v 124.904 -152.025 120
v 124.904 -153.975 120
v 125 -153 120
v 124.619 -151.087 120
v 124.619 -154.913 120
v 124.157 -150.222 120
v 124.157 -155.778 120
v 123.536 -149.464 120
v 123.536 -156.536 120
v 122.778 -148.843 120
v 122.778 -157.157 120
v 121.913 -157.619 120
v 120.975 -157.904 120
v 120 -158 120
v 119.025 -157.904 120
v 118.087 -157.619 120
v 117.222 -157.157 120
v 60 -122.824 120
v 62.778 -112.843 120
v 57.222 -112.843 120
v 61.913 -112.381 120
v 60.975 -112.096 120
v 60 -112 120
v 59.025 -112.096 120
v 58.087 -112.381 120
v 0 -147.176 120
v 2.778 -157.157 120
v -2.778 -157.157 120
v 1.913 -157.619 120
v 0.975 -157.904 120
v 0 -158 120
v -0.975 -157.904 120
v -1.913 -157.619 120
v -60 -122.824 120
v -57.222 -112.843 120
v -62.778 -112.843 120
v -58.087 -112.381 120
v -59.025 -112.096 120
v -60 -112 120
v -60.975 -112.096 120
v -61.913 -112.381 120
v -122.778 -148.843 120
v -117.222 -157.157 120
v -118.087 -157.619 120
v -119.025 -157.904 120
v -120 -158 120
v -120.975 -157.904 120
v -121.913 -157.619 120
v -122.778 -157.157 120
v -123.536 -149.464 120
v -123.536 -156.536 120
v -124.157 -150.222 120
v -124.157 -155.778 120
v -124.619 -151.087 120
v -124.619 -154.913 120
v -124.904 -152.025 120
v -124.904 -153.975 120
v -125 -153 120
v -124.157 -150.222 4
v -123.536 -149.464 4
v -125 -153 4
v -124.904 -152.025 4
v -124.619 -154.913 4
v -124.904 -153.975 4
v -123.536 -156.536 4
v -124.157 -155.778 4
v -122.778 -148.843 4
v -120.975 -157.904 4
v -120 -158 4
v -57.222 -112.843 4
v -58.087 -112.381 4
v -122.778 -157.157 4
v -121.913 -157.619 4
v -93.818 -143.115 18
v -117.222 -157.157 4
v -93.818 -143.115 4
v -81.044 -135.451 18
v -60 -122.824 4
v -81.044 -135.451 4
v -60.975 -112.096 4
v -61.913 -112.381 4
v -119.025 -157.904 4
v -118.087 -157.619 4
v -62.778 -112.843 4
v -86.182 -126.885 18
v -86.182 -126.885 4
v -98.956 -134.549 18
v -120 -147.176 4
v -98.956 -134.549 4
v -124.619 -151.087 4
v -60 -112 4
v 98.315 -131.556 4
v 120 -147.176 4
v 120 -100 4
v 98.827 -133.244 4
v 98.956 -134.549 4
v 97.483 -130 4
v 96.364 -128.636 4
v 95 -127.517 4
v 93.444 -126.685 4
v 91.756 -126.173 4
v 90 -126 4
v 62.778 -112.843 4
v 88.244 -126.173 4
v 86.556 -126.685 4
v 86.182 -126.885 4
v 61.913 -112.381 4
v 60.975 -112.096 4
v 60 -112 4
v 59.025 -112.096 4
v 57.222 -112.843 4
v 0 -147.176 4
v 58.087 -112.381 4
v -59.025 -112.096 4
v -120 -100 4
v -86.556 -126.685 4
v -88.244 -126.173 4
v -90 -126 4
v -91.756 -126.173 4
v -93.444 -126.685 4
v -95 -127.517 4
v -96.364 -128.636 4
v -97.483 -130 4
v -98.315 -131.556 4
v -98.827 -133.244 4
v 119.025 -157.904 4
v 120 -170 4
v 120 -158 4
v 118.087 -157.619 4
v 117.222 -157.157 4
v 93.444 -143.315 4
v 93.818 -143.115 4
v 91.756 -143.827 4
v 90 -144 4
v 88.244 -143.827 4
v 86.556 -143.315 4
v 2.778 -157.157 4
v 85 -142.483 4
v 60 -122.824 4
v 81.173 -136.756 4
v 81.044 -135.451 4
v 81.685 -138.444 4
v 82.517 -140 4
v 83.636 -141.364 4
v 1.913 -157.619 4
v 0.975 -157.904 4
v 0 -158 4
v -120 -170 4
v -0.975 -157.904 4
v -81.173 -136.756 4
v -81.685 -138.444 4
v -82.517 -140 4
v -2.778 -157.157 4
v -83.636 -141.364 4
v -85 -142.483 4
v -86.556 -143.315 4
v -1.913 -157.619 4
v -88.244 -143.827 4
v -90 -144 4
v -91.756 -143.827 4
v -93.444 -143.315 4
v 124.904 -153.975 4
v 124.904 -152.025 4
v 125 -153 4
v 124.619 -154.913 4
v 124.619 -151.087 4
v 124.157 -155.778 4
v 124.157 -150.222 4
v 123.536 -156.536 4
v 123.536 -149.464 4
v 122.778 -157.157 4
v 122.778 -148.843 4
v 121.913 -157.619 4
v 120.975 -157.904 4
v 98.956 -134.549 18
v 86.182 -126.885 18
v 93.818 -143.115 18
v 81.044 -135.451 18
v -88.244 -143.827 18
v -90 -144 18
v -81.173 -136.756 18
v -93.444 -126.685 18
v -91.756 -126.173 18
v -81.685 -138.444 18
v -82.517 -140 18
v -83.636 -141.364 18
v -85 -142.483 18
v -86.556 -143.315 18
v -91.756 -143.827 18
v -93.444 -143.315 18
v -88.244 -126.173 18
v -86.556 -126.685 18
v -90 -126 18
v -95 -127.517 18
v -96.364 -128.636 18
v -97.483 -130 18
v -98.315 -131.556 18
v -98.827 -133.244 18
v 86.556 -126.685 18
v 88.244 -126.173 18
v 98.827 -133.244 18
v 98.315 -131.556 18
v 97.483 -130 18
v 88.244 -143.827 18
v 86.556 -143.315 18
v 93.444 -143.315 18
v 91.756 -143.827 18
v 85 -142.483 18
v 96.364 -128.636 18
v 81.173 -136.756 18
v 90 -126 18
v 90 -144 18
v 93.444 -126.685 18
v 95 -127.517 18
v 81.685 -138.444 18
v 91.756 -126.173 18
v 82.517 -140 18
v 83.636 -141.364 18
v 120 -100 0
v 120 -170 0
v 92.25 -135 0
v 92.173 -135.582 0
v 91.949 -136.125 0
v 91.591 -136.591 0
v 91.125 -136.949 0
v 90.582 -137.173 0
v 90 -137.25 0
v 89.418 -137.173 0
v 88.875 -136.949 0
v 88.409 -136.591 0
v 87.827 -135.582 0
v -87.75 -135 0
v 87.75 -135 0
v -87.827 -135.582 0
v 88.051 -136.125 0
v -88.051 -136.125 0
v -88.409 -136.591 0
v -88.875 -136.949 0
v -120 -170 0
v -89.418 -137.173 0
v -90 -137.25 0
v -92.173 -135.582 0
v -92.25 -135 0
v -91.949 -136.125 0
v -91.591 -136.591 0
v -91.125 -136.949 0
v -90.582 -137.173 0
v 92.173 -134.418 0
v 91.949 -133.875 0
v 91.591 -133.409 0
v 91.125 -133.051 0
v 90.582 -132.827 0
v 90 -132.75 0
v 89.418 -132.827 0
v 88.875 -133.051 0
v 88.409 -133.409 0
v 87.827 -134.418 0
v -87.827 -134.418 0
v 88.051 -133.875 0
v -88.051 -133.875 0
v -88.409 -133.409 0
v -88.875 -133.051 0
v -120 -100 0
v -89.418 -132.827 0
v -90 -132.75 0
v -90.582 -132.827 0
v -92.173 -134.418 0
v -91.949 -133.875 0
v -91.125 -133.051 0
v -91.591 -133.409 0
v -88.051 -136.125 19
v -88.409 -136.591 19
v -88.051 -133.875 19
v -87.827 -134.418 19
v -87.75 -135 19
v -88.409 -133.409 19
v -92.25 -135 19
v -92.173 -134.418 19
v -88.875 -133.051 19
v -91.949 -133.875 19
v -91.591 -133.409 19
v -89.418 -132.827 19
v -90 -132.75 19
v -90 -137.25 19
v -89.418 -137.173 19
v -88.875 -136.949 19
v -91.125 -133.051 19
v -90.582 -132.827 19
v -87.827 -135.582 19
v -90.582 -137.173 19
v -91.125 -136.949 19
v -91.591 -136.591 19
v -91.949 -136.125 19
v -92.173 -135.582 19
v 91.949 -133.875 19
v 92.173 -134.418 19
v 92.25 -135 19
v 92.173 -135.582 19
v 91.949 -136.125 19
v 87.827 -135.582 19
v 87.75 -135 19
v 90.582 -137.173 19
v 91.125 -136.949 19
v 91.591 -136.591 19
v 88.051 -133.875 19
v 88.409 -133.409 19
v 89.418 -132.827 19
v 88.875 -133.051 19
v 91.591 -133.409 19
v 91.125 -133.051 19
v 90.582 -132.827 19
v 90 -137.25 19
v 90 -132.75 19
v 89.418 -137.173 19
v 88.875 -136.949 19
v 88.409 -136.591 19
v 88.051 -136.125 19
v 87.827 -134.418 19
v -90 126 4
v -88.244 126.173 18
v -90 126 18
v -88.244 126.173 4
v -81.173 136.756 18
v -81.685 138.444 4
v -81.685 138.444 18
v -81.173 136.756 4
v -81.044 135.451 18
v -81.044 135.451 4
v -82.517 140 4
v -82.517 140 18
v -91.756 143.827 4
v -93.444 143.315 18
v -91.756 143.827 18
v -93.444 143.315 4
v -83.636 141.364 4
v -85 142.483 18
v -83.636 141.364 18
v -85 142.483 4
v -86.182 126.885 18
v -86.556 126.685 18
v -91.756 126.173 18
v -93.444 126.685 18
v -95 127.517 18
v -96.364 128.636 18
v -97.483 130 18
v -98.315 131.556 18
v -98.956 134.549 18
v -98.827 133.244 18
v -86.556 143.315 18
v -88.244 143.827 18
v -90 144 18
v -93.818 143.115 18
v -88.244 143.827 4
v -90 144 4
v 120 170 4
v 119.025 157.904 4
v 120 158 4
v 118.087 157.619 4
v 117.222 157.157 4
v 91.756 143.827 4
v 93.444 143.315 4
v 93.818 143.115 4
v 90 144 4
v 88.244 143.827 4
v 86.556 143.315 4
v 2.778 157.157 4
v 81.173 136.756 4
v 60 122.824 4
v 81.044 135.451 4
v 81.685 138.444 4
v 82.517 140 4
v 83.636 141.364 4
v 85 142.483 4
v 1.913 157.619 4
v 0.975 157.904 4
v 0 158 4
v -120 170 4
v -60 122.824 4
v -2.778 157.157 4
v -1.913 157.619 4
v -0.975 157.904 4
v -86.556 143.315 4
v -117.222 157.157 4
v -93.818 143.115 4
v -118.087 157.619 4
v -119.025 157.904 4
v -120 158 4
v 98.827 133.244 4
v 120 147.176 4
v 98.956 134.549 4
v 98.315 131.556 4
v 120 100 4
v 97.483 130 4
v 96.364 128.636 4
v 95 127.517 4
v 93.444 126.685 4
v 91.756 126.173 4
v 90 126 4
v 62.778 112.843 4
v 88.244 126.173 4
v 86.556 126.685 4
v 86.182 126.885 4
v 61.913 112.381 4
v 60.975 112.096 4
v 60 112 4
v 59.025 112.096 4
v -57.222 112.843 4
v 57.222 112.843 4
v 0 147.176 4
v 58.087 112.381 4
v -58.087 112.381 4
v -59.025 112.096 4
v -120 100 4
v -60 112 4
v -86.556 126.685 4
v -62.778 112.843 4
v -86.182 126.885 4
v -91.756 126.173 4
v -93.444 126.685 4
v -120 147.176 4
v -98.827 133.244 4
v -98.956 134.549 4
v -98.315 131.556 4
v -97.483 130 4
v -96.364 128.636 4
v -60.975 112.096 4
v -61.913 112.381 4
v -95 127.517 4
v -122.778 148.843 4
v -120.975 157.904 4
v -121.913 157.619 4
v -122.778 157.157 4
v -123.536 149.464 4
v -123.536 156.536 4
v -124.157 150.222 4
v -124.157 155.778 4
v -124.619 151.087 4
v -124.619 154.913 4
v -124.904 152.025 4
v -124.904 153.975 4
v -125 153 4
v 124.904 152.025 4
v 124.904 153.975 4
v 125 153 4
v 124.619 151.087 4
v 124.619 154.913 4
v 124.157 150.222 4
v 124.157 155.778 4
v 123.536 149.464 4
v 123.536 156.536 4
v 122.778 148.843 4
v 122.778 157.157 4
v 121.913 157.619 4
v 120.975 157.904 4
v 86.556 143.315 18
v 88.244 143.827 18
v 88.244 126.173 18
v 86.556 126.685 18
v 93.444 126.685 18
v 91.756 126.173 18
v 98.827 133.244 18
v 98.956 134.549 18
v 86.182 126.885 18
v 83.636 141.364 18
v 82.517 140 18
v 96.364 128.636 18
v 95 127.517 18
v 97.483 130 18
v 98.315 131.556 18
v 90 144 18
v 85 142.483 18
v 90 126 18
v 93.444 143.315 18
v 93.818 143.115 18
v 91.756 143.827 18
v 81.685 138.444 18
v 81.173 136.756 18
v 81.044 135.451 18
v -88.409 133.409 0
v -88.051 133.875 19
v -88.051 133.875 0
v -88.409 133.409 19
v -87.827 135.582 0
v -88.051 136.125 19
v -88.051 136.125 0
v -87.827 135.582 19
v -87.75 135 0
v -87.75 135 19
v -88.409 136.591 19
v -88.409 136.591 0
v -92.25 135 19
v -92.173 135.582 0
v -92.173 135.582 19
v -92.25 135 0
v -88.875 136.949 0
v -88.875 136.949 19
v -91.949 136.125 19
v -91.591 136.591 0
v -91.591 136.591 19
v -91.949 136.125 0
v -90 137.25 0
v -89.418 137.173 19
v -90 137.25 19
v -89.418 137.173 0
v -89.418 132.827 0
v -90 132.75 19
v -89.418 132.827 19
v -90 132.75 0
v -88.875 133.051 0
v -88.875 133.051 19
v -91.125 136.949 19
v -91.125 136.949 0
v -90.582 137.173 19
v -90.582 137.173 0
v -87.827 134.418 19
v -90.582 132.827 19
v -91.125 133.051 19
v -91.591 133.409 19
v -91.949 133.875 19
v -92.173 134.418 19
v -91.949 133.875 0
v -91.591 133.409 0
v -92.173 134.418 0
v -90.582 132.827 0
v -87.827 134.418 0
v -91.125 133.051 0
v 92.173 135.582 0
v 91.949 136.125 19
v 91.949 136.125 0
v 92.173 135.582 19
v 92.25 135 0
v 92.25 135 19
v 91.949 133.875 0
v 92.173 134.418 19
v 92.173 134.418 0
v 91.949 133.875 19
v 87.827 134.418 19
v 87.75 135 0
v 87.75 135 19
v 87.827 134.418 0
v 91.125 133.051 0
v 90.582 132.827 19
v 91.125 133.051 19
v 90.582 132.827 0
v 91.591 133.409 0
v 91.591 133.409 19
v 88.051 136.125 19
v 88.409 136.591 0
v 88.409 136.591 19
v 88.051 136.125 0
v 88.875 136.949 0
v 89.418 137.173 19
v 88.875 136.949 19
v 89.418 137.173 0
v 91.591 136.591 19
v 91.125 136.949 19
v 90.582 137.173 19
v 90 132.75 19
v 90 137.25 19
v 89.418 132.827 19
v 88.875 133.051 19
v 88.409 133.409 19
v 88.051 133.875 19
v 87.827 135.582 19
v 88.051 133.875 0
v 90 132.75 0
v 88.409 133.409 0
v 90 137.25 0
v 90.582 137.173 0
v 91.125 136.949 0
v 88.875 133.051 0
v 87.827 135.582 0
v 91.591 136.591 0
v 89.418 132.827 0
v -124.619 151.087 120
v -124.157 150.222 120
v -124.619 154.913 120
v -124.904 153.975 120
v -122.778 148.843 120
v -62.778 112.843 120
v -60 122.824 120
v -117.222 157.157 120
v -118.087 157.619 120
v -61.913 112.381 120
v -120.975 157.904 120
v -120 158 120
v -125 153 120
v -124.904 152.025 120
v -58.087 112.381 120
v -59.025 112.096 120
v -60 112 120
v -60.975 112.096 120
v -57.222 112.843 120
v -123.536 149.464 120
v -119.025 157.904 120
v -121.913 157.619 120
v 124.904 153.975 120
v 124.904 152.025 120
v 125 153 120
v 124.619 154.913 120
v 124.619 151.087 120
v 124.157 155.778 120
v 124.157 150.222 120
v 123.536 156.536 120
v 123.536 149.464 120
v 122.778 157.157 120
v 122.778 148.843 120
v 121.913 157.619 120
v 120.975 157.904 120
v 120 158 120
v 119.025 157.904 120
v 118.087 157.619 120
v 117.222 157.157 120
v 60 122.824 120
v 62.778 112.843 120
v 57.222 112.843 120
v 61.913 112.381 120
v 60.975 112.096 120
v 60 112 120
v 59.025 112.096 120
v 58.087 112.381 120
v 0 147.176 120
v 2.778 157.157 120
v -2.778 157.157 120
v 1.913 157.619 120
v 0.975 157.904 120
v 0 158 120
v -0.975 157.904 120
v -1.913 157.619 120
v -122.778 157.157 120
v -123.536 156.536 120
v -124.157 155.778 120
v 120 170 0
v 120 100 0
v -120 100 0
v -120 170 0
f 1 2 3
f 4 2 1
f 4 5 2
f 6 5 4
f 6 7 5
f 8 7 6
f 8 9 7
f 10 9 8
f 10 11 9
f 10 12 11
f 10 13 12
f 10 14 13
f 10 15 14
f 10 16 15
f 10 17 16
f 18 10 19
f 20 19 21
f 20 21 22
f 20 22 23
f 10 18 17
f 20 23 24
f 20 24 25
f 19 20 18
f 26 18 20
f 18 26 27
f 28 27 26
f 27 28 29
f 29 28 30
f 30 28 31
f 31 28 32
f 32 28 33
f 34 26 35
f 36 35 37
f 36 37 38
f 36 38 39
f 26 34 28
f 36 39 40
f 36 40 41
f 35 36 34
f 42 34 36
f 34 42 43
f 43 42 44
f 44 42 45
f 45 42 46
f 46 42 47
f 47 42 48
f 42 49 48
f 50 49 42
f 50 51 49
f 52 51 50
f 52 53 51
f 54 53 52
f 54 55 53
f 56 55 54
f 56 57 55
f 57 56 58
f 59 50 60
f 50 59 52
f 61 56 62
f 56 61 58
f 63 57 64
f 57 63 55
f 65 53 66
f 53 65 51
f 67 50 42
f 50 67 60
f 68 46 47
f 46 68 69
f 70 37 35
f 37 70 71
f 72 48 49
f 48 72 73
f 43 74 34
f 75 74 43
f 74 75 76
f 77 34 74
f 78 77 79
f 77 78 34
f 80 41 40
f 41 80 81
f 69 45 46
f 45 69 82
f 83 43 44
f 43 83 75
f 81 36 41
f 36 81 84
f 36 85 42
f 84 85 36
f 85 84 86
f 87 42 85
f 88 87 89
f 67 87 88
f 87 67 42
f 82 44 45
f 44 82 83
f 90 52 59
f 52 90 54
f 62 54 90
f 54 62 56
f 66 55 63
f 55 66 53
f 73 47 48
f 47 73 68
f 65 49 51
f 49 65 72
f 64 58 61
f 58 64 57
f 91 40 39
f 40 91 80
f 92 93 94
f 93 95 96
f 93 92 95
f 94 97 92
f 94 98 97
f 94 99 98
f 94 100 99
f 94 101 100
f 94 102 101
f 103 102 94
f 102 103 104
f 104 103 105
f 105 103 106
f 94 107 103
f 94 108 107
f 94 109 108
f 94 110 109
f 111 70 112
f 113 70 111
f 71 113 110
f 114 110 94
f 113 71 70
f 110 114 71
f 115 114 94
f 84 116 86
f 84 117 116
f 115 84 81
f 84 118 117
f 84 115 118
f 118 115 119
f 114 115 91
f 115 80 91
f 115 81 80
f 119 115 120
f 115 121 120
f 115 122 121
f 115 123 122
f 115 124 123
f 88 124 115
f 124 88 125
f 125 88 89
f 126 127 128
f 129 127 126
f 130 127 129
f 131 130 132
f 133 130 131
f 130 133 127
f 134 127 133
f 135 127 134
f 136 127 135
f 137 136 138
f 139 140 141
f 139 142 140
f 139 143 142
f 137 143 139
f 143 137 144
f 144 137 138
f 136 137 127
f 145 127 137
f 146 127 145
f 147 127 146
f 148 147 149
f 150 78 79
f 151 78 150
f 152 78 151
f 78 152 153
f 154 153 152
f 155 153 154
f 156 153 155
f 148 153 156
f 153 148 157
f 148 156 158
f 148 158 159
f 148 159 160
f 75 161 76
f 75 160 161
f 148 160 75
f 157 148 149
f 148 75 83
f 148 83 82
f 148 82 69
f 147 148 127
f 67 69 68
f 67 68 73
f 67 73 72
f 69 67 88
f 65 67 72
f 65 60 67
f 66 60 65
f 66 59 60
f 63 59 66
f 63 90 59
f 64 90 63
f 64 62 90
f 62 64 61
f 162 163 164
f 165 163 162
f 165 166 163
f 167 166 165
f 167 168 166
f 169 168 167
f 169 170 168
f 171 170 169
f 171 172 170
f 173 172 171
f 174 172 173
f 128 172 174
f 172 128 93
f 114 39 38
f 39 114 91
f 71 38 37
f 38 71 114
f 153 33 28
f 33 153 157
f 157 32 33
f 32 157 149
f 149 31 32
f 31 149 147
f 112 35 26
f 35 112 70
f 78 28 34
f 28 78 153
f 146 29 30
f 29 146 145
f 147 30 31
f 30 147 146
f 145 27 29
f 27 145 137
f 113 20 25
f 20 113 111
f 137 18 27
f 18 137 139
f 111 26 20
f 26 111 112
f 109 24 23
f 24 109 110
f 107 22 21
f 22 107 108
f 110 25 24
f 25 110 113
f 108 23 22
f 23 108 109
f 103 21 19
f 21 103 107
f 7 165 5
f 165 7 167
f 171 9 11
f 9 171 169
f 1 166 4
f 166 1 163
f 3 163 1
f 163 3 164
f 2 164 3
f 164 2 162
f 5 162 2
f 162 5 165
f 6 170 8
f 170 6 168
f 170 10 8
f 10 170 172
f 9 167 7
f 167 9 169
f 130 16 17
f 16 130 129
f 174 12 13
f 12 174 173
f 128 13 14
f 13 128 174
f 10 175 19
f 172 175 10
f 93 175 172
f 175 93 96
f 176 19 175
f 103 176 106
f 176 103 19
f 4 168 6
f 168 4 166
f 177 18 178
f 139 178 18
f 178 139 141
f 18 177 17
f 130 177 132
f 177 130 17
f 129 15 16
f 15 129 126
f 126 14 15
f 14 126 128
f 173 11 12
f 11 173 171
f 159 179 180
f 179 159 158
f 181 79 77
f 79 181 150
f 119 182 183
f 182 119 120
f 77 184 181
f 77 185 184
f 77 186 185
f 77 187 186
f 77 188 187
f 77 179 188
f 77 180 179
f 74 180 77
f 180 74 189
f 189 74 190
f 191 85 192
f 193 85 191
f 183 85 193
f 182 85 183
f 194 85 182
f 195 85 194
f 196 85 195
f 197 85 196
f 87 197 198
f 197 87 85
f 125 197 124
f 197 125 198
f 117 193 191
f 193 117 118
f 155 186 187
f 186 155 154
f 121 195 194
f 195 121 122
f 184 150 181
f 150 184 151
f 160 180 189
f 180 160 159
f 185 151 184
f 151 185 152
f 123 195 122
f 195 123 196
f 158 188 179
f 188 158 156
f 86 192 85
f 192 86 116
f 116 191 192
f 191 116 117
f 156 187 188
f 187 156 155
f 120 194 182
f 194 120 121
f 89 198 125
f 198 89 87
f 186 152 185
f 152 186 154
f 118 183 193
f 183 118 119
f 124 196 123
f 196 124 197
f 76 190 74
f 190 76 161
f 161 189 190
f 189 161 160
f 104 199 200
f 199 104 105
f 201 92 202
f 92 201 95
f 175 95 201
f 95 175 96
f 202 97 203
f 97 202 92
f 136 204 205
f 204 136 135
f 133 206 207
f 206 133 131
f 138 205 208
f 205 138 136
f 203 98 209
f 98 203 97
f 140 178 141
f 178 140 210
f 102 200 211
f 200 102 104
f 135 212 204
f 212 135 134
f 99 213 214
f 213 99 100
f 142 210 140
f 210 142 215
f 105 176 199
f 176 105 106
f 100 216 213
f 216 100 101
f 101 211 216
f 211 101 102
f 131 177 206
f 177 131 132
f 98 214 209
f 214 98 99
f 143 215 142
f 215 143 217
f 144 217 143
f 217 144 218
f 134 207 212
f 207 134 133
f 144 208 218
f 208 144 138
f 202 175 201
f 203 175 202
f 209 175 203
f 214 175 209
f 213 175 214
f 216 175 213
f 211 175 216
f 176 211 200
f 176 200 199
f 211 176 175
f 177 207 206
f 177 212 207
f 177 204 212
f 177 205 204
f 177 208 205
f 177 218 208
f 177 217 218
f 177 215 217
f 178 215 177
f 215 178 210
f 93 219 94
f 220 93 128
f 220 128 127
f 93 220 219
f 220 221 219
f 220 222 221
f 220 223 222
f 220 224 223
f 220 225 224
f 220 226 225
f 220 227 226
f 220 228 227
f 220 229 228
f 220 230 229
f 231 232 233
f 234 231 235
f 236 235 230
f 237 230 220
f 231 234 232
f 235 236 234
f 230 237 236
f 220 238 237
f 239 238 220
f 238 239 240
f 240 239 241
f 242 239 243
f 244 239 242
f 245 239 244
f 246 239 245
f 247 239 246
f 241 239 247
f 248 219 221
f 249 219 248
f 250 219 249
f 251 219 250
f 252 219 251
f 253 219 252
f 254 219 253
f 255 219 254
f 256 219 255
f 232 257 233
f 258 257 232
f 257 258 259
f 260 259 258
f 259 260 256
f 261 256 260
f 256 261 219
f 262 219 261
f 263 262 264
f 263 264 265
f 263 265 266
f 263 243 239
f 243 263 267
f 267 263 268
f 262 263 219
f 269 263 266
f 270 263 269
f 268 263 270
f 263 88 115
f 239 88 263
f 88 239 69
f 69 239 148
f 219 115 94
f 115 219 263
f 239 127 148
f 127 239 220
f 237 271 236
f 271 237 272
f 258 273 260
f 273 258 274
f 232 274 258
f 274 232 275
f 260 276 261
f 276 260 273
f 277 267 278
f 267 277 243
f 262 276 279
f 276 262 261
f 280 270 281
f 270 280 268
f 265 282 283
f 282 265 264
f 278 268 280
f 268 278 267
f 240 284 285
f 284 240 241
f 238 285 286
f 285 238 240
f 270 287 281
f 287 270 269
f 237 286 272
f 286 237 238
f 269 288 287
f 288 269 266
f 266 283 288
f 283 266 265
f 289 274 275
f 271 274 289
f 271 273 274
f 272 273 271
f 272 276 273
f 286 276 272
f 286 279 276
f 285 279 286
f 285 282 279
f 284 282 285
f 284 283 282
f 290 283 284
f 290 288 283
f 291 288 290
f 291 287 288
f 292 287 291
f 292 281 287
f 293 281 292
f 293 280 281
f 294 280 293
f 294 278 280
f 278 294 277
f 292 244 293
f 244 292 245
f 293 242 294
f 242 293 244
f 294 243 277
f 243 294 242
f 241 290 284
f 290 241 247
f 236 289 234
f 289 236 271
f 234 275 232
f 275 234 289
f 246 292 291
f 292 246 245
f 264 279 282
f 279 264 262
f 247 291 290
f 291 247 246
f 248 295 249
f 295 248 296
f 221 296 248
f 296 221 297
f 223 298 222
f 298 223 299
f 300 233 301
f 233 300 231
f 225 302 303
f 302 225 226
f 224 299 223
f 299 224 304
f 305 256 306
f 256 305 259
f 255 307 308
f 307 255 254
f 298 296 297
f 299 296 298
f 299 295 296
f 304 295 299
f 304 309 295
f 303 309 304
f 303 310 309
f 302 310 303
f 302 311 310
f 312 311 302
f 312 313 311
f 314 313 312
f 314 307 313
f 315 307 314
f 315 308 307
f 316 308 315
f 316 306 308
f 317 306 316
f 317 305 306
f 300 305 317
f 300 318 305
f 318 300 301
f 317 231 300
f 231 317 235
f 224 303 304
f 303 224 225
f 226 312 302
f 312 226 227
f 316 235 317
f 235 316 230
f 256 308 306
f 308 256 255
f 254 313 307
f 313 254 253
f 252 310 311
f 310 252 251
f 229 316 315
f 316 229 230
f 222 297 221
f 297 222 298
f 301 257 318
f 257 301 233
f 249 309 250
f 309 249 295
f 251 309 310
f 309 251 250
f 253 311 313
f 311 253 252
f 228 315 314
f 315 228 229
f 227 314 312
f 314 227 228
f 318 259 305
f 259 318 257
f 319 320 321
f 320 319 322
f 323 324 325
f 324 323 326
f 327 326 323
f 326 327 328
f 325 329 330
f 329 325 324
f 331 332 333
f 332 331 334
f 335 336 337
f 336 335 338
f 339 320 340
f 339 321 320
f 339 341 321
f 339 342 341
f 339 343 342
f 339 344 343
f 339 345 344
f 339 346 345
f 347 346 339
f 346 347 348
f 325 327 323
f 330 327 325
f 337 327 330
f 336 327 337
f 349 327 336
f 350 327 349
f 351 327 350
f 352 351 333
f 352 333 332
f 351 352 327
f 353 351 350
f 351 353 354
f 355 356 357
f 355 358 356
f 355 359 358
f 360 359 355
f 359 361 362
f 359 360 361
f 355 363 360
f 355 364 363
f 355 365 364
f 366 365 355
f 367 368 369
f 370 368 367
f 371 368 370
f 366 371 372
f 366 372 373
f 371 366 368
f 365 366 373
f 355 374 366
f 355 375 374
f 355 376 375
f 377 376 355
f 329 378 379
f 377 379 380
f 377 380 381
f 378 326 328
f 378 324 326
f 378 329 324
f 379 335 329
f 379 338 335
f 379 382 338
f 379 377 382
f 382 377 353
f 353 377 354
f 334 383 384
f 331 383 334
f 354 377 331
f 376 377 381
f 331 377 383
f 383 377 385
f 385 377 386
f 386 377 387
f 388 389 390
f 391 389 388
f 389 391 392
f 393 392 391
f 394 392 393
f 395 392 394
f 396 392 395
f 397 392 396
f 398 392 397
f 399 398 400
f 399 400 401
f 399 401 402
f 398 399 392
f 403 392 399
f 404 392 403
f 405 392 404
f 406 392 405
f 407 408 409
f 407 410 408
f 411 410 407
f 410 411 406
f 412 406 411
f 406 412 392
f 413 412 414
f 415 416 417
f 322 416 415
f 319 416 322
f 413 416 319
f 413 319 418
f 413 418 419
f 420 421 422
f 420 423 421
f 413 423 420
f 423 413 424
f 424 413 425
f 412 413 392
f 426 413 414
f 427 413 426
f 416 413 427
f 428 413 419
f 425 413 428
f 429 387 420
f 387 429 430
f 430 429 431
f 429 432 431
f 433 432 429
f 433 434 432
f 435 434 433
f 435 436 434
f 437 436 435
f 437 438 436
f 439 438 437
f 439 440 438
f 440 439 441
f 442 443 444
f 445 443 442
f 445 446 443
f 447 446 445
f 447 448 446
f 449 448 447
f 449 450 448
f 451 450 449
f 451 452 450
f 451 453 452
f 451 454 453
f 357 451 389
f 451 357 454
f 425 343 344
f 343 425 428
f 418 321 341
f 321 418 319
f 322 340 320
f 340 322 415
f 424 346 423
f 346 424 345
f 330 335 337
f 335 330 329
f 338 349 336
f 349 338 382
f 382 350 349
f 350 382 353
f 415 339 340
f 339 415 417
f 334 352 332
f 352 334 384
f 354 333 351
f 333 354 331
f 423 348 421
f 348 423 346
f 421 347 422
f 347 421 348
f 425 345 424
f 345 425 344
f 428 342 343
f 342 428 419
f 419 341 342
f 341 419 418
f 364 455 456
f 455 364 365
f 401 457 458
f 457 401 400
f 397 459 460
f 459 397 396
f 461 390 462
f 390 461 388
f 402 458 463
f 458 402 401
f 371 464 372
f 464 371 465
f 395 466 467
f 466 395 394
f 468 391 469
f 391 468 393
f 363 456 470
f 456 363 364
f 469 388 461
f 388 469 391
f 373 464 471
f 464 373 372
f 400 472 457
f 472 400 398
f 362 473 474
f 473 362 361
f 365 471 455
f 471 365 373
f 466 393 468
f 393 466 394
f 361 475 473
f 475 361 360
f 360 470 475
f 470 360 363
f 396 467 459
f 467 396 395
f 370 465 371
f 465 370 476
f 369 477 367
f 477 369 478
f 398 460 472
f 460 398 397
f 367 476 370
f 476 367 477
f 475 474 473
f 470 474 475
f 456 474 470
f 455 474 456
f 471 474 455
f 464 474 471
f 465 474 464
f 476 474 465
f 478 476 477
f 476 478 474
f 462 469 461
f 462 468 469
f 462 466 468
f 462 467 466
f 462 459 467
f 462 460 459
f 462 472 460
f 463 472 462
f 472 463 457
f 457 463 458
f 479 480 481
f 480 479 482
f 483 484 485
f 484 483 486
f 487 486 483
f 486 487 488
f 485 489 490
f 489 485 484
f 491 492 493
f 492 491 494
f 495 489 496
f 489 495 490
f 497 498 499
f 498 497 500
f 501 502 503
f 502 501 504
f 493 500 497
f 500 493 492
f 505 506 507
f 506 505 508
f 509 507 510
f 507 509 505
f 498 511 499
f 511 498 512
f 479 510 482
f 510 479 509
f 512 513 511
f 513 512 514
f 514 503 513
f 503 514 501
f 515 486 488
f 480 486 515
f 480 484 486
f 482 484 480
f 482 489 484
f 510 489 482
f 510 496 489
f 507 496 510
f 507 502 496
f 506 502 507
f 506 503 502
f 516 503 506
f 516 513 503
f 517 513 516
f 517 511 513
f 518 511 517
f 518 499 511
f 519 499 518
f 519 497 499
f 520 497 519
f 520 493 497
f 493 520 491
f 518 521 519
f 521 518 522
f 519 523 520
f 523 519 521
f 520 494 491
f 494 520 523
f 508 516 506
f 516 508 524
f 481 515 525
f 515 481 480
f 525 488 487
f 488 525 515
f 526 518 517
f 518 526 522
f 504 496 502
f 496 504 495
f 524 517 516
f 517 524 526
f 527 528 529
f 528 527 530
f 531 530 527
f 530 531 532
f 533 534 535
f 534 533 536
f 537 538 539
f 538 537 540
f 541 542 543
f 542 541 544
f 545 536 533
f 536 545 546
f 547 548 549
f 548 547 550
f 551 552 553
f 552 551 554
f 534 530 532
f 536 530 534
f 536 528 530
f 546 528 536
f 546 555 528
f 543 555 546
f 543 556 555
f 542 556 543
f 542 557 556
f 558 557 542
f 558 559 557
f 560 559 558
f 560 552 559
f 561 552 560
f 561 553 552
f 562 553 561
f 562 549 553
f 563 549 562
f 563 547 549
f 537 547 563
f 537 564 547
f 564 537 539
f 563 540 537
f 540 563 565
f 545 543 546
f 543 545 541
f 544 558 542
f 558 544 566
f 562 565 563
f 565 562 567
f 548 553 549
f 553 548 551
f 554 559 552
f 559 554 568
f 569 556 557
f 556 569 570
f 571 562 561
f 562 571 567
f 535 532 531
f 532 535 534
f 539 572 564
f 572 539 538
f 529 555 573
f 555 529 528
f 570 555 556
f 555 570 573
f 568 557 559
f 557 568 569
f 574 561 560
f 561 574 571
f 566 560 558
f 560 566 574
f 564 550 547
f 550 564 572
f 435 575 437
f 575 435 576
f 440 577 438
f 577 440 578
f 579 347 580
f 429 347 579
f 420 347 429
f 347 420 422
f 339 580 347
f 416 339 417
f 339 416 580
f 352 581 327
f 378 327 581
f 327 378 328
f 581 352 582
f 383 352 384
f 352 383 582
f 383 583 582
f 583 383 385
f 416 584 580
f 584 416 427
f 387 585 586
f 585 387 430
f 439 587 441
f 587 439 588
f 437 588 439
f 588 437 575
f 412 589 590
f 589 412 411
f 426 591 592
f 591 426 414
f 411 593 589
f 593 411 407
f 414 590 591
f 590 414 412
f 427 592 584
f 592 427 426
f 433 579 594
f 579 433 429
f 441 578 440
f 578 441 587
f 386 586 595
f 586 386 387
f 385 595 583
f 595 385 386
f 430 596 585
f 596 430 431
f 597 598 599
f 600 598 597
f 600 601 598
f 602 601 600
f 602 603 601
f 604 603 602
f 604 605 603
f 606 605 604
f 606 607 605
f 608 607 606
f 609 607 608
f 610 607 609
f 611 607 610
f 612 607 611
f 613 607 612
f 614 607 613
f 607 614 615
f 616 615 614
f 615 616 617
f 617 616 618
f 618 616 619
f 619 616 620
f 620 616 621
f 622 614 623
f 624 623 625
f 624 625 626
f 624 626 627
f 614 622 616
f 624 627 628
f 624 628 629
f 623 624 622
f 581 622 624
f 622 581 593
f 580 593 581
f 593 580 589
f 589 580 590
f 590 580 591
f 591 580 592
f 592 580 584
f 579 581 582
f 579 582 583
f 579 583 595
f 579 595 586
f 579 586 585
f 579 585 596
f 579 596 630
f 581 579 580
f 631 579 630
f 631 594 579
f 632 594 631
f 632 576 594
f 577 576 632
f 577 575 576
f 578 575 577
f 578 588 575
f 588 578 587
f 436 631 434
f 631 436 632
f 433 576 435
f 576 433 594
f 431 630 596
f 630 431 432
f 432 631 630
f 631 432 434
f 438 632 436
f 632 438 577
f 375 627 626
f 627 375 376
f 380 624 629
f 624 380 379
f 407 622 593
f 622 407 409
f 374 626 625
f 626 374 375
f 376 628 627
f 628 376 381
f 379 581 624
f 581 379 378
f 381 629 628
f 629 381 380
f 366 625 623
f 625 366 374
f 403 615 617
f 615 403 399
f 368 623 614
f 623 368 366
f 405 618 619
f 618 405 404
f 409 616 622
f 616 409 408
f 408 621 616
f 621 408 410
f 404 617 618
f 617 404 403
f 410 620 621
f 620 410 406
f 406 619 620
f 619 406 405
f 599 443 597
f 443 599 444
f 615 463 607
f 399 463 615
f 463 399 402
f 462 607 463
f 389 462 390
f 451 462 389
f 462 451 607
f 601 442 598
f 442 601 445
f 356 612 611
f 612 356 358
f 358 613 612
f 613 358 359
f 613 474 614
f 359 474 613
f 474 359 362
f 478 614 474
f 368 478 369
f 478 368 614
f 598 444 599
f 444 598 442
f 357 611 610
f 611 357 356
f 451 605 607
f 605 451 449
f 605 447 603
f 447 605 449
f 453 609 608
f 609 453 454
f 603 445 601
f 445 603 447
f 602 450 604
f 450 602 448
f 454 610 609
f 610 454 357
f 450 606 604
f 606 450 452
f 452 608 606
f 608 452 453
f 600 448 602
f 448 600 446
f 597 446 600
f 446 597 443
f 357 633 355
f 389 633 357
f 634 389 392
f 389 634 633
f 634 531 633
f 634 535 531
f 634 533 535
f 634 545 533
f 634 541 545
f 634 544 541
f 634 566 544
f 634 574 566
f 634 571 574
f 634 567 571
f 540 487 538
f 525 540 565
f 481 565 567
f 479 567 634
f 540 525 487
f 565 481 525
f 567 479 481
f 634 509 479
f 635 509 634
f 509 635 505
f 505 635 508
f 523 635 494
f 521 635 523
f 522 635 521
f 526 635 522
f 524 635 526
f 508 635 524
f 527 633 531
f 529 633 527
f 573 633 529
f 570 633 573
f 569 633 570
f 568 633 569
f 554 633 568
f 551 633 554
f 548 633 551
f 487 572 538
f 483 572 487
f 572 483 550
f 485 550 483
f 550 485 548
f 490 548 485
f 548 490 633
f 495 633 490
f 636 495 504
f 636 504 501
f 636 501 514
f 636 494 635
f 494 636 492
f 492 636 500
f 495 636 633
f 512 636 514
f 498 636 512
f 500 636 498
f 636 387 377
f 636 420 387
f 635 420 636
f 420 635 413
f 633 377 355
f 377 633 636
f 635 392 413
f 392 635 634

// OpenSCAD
// file: ../models/drone-playground-canyon-right/model.scad
wall_length=240; wall_depth=70; wall_height=120; wall_thickness=10; base_thickness=4; mount_hole_diameter=4.5;
module canyon_wall_right() { difference() { union() {
 translate([-wall_length/2,-wall_depth/2,0]) cube([wall_length,wall_depth,base_thickness]);
 for(i=[0:3]) { x1=-wall_length/2+i*wall_length/4; x2=-wall_length/2+(i+1)*wall_length/4; y1=-(i%2==0?-18:18); y2=-((i+1)%2==0?-18:18);
  hull(){ translate([x1,y1,base_thickness]) cylinder(d=wall_thickness,h=wall_height-base_thickness,$fn=32); translate([x2,y2,base_thickness]) cylinder(d=wall_thickness,h=wall_height-base_thickness,$fn=32); }}
 for(x=[-90,90]) translate([x,0,base_thickness]) cylinder(d=18,h=14,$fn=32);
 } for(x=[-90,90]) translate([x,0,-1]) cylinder(d=mount_hole_diameter,h=20,$fn=24); }}
assert(wall_length==240 && wall_depth==70 && wall_height==120); echo("SCADCTL_REQUIREMENT:parameters:PASS"); canyon_wall_right();
// file: ../models/drone-playground-canyon-left/model.scad
wall_length=240; wall_depth=70; wall_height=120; wall_thickness=10; base_thickness=4; mount_hole_diameter=4.5;
module canyon_wall_left() { difference() { union() {
 translate([-wall_length/2,-wall_depth/2,0]) cube([wall_length,wall_depth,base_thickness]);
 for(i=[0:3]) { x1=-wall_length/2+i*wall_length/4; x2=-wall_length/2+(i+1)*wall_length/4; y1=i%2==0?-18:18; y2=(i+1)%2==0?-18:18;
  hull(){ translate([x1,y1,base_thickness]) cylinder(d=wall_thickness,h=wall_height-base_thickness,$fn=32); translate([x2,y2,base_thickness]) cylinder(d=wall_thickness,h=wall_height-base_thickness,$fn=32); }}
 for(x=[-90,90]) translate([x,0,base_thickness]) cylinder(d=18,h=14,$fn=32);
 } for(x=[-90,90]) translate([x,0,-1]) cylinder(d=mount_hole_diameter,h=20,$fn=24); }}
assert(wall_length==240 && wall_depth==70 && wall_height==120); echo("SCADCTL_REQUIREMENT:parameters:PASS"); canyon_wall_left();
// main file
use <../models/drone-playground-canyon-left/model.scad>
use <../models/drone-playground-canyon-right/model.scad>
color("orange") translate([0,-135,0]) canyon_wall_left();
color("deepskyblue") translate([0,135,0]) canyon_wall_right();
